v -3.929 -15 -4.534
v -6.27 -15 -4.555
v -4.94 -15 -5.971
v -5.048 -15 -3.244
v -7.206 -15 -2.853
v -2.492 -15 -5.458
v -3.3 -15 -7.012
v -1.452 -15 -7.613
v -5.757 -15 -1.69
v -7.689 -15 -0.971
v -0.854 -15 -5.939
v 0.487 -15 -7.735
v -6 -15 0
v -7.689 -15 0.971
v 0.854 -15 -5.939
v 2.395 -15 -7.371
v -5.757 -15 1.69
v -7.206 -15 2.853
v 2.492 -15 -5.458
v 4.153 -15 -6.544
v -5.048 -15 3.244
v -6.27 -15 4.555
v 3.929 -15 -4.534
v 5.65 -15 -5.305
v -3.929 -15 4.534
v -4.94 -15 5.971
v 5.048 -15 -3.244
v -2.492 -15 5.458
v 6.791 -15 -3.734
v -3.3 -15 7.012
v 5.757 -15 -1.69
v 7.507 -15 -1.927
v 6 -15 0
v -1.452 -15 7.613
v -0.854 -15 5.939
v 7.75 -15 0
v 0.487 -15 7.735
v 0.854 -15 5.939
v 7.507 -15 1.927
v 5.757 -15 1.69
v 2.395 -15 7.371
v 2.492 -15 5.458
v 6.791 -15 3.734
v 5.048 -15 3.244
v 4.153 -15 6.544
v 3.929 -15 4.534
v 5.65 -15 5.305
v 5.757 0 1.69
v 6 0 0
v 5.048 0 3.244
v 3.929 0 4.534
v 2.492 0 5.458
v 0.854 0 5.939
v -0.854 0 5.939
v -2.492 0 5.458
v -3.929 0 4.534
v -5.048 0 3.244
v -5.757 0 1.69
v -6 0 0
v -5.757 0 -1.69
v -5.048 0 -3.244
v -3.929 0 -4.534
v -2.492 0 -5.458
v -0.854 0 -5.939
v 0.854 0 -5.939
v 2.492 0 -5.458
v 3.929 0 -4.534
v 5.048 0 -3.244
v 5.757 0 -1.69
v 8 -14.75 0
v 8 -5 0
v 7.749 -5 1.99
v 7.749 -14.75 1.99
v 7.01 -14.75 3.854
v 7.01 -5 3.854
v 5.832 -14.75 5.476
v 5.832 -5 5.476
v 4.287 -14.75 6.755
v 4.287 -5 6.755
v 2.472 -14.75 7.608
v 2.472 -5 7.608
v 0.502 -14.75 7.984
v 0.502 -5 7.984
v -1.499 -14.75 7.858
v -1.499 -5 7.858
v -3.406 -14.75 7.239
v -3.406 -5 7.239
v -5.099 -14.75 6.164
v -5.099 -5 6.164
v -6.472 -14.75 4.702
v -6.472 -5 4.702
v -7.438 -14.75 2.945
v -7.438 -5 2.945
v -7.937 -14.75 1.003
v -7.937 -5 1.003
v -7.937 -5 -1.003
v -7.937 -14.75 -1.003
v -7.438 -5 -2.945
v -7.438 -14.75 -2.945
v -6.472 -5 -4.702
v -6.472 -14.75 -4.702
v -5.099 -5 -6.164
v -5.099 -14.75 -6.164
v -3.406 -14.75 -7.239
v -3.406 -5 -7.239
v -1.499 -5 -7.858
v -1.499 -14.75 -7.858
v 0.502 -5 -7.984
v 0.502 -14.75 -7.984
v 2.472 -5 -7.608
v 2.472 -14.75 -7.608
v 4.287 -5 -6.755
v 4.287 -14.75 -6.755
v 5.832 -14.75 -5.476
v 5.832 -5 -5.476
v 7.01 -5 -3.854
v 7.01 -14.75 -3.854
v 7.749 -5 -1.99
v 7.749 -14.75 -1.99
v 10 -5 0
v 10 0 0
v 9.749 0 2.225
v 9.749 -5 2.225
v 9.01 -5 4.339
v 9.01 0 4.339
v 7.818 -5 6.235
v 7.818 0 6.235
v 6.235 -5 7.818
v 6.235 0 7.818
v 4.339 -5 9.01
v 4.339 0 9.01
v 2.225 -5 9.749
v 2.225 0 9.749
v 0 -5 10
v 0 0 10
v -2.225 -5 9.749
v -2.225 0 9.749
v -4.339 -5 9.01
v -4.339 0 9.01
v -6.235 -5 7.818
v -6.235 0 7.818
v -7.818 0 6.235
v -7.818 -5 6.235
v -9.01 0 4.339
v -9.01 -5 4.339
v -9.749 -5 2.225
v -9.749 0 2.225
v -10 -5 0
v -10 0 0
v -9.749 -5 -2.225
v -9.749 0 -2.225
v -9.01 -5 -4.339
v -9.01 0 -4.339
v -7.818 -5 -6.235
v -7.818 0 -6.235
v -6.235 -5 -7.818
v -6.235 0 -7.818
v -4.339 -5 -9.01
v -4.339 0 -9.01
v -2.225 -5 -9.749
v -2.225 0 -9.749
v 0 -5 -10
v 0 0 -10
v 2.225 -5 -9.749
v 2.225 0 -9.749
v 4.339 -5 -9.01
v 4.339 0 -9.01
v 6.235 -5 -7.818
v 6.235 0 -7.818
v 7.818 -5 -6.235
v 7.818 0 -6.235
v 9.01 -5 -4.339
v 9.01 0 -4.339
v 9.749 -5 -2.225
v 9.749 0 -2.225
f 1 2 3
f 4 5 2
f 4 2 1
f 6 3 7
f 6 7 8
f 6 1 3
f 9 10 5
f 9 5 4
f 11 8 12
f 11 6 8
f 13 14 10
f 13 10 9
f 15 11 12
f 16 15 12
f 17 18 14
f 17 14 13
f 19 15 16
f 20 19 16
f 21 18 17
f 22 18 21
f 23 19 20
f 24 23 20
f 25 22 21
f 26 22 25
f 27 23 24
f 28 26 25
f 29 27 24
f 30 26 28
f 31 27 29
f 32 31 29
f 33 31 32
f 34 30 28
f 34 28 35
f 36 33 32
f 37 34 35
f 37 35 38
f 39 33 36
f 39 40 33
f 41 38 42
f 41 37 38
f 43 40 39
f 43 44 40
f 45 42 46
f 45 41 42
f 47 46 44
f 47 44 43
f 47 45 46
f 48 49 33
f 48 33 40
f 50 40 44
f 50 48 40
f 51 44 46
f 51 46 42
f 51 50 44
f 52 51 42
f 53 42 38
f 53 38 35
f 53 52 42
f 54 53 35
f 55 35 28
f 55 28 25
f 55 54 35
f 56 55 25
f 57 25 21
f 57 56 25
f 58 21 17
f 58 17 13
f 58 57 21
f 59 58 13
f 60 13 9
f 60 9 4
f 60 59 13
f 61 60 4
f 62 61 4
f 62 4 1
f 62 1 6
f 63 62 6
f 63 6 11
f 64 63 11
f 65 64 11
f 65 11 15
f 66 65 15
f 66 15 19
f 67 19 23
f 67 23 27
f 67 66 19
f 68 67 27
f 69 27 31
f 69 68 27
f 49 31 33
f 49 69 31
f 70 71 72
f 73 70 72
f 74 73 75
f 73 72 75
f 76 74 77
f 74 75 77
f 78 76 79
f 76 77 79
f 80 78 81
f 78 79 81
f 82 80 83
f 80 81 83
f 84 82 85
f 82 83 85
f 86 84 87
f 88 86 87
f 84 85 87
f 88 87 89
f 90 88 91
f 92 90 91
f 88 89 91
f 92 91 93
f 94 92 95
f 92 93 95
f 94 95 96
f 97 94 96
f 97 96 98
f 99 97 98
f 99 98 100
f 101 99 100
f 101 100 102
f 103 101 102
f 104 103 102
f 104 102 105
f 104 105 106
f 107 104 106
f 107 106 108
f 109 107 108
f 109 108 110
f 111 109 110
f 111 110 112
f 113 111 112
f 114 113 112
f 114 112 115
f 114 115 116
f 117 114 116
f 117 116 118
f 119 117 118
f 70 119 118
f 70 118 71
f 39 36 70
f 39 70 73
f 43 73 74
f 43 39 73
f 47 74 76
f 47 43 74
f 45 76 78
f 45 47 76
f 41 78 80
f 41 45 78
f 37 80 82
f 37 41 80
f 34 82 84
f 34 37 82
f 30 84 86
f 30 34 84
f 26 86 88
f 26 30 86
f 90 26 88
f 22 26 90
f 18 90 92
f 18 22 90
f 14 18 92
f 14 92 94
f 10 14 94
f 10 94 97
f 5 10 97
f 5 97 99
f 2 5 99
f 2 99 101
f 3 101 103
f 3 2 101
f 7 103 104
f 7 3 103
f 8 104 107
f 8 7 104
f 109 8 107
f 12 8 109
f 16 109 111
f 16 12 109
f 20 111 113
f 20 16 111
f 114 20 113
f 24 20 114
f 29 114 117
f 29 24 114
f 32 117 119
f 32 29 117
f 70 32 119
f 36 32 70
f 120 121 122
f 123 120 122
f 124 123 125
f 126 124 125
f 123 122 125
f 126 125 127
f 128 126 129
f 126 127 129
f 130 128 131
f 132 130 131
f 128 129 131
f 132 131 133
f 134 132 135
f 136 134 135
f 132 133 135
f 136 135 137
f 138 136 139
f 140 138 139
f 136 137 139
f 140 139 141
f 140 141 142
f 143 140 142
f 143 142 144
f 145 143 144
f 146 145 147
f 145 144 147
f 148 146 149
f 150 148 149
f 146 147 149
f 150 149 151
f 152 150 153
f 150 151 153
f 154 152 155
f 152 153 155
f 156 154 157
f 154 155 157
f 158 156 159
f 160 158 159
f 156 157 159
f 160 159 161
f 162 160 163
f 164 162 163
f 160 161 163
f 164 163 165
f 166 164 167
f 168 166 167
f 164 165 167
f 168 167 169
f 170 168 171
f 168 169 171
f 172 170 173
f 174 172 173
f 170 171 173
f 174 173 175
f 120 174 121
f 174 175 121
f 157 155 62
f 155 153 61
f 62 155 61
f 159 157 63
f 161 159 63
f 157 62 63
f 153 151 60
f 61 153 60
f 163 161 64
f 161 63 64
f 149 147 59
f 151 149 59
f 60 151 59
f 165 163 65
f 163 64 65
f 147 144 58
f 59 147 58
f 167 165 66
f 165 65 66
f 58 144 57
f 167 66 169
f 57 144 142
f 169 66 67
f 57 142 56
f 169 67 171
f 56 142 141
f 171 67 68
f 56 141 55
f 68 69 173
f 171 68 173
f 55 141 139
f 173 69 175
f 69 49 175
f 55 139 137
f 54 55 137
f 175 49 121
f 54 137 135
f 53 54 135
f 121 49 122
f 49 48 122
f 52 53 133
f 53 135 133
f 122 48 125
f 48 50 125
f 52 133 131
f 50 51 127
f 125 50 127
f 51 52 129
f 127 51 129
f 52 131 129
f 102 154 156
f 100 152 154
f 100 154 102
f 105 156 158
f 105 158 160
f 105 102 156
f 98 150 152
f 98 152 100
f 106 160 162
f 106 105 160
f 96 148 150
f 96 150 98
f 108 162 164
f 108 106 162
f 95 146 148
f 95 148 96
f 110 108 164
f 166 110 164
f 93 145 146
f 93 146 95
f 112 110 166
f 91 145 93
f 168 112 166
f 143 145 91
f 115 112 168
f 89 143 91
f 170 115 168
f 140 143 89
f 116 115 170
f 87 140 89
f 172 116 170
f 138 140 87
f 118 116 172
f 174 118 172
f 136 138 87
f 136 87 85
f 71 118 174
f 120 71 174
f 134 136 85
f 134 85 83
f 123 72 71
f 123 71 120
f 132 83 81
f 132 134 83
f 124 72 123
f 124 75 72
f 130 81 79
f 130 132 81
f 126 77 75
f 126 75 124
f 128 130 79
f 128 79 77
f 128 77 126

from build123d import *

# Parameters (mm, degrees)
F0_R     = 8
F0_R_2   = 6
F1_DEPTH = 15
F0_R_3   = 10
F2_DEPTH = 5
F3_SIZE  = 0.25


with BuildPart() as f1:
    # F0 (on Front) → F1 (new body)
    with BuildSketch(Plane.XZ):
        Circle(F0_R)
        Circle(F0_R_2, mode=Mode.SUBTRACT)
    extrude(amount=F1_DEPTH)

    # F0 (on Front) → F2 (join)
    with BuildSketch(Plane.XZ):
        Circle(F0_R_3)
        Circle(F0_R, mode=Mode.SUBTRACT)
    extrude(amount=F2_DEPTH)

    # F3
    f3_edges = [f1.edges().sort_by_distance(p)[0] for p in [
        (-8, -15, 0),
    ]]
    chamfer(f3_edges, length=F3_SIZE)


solid = f1.part
